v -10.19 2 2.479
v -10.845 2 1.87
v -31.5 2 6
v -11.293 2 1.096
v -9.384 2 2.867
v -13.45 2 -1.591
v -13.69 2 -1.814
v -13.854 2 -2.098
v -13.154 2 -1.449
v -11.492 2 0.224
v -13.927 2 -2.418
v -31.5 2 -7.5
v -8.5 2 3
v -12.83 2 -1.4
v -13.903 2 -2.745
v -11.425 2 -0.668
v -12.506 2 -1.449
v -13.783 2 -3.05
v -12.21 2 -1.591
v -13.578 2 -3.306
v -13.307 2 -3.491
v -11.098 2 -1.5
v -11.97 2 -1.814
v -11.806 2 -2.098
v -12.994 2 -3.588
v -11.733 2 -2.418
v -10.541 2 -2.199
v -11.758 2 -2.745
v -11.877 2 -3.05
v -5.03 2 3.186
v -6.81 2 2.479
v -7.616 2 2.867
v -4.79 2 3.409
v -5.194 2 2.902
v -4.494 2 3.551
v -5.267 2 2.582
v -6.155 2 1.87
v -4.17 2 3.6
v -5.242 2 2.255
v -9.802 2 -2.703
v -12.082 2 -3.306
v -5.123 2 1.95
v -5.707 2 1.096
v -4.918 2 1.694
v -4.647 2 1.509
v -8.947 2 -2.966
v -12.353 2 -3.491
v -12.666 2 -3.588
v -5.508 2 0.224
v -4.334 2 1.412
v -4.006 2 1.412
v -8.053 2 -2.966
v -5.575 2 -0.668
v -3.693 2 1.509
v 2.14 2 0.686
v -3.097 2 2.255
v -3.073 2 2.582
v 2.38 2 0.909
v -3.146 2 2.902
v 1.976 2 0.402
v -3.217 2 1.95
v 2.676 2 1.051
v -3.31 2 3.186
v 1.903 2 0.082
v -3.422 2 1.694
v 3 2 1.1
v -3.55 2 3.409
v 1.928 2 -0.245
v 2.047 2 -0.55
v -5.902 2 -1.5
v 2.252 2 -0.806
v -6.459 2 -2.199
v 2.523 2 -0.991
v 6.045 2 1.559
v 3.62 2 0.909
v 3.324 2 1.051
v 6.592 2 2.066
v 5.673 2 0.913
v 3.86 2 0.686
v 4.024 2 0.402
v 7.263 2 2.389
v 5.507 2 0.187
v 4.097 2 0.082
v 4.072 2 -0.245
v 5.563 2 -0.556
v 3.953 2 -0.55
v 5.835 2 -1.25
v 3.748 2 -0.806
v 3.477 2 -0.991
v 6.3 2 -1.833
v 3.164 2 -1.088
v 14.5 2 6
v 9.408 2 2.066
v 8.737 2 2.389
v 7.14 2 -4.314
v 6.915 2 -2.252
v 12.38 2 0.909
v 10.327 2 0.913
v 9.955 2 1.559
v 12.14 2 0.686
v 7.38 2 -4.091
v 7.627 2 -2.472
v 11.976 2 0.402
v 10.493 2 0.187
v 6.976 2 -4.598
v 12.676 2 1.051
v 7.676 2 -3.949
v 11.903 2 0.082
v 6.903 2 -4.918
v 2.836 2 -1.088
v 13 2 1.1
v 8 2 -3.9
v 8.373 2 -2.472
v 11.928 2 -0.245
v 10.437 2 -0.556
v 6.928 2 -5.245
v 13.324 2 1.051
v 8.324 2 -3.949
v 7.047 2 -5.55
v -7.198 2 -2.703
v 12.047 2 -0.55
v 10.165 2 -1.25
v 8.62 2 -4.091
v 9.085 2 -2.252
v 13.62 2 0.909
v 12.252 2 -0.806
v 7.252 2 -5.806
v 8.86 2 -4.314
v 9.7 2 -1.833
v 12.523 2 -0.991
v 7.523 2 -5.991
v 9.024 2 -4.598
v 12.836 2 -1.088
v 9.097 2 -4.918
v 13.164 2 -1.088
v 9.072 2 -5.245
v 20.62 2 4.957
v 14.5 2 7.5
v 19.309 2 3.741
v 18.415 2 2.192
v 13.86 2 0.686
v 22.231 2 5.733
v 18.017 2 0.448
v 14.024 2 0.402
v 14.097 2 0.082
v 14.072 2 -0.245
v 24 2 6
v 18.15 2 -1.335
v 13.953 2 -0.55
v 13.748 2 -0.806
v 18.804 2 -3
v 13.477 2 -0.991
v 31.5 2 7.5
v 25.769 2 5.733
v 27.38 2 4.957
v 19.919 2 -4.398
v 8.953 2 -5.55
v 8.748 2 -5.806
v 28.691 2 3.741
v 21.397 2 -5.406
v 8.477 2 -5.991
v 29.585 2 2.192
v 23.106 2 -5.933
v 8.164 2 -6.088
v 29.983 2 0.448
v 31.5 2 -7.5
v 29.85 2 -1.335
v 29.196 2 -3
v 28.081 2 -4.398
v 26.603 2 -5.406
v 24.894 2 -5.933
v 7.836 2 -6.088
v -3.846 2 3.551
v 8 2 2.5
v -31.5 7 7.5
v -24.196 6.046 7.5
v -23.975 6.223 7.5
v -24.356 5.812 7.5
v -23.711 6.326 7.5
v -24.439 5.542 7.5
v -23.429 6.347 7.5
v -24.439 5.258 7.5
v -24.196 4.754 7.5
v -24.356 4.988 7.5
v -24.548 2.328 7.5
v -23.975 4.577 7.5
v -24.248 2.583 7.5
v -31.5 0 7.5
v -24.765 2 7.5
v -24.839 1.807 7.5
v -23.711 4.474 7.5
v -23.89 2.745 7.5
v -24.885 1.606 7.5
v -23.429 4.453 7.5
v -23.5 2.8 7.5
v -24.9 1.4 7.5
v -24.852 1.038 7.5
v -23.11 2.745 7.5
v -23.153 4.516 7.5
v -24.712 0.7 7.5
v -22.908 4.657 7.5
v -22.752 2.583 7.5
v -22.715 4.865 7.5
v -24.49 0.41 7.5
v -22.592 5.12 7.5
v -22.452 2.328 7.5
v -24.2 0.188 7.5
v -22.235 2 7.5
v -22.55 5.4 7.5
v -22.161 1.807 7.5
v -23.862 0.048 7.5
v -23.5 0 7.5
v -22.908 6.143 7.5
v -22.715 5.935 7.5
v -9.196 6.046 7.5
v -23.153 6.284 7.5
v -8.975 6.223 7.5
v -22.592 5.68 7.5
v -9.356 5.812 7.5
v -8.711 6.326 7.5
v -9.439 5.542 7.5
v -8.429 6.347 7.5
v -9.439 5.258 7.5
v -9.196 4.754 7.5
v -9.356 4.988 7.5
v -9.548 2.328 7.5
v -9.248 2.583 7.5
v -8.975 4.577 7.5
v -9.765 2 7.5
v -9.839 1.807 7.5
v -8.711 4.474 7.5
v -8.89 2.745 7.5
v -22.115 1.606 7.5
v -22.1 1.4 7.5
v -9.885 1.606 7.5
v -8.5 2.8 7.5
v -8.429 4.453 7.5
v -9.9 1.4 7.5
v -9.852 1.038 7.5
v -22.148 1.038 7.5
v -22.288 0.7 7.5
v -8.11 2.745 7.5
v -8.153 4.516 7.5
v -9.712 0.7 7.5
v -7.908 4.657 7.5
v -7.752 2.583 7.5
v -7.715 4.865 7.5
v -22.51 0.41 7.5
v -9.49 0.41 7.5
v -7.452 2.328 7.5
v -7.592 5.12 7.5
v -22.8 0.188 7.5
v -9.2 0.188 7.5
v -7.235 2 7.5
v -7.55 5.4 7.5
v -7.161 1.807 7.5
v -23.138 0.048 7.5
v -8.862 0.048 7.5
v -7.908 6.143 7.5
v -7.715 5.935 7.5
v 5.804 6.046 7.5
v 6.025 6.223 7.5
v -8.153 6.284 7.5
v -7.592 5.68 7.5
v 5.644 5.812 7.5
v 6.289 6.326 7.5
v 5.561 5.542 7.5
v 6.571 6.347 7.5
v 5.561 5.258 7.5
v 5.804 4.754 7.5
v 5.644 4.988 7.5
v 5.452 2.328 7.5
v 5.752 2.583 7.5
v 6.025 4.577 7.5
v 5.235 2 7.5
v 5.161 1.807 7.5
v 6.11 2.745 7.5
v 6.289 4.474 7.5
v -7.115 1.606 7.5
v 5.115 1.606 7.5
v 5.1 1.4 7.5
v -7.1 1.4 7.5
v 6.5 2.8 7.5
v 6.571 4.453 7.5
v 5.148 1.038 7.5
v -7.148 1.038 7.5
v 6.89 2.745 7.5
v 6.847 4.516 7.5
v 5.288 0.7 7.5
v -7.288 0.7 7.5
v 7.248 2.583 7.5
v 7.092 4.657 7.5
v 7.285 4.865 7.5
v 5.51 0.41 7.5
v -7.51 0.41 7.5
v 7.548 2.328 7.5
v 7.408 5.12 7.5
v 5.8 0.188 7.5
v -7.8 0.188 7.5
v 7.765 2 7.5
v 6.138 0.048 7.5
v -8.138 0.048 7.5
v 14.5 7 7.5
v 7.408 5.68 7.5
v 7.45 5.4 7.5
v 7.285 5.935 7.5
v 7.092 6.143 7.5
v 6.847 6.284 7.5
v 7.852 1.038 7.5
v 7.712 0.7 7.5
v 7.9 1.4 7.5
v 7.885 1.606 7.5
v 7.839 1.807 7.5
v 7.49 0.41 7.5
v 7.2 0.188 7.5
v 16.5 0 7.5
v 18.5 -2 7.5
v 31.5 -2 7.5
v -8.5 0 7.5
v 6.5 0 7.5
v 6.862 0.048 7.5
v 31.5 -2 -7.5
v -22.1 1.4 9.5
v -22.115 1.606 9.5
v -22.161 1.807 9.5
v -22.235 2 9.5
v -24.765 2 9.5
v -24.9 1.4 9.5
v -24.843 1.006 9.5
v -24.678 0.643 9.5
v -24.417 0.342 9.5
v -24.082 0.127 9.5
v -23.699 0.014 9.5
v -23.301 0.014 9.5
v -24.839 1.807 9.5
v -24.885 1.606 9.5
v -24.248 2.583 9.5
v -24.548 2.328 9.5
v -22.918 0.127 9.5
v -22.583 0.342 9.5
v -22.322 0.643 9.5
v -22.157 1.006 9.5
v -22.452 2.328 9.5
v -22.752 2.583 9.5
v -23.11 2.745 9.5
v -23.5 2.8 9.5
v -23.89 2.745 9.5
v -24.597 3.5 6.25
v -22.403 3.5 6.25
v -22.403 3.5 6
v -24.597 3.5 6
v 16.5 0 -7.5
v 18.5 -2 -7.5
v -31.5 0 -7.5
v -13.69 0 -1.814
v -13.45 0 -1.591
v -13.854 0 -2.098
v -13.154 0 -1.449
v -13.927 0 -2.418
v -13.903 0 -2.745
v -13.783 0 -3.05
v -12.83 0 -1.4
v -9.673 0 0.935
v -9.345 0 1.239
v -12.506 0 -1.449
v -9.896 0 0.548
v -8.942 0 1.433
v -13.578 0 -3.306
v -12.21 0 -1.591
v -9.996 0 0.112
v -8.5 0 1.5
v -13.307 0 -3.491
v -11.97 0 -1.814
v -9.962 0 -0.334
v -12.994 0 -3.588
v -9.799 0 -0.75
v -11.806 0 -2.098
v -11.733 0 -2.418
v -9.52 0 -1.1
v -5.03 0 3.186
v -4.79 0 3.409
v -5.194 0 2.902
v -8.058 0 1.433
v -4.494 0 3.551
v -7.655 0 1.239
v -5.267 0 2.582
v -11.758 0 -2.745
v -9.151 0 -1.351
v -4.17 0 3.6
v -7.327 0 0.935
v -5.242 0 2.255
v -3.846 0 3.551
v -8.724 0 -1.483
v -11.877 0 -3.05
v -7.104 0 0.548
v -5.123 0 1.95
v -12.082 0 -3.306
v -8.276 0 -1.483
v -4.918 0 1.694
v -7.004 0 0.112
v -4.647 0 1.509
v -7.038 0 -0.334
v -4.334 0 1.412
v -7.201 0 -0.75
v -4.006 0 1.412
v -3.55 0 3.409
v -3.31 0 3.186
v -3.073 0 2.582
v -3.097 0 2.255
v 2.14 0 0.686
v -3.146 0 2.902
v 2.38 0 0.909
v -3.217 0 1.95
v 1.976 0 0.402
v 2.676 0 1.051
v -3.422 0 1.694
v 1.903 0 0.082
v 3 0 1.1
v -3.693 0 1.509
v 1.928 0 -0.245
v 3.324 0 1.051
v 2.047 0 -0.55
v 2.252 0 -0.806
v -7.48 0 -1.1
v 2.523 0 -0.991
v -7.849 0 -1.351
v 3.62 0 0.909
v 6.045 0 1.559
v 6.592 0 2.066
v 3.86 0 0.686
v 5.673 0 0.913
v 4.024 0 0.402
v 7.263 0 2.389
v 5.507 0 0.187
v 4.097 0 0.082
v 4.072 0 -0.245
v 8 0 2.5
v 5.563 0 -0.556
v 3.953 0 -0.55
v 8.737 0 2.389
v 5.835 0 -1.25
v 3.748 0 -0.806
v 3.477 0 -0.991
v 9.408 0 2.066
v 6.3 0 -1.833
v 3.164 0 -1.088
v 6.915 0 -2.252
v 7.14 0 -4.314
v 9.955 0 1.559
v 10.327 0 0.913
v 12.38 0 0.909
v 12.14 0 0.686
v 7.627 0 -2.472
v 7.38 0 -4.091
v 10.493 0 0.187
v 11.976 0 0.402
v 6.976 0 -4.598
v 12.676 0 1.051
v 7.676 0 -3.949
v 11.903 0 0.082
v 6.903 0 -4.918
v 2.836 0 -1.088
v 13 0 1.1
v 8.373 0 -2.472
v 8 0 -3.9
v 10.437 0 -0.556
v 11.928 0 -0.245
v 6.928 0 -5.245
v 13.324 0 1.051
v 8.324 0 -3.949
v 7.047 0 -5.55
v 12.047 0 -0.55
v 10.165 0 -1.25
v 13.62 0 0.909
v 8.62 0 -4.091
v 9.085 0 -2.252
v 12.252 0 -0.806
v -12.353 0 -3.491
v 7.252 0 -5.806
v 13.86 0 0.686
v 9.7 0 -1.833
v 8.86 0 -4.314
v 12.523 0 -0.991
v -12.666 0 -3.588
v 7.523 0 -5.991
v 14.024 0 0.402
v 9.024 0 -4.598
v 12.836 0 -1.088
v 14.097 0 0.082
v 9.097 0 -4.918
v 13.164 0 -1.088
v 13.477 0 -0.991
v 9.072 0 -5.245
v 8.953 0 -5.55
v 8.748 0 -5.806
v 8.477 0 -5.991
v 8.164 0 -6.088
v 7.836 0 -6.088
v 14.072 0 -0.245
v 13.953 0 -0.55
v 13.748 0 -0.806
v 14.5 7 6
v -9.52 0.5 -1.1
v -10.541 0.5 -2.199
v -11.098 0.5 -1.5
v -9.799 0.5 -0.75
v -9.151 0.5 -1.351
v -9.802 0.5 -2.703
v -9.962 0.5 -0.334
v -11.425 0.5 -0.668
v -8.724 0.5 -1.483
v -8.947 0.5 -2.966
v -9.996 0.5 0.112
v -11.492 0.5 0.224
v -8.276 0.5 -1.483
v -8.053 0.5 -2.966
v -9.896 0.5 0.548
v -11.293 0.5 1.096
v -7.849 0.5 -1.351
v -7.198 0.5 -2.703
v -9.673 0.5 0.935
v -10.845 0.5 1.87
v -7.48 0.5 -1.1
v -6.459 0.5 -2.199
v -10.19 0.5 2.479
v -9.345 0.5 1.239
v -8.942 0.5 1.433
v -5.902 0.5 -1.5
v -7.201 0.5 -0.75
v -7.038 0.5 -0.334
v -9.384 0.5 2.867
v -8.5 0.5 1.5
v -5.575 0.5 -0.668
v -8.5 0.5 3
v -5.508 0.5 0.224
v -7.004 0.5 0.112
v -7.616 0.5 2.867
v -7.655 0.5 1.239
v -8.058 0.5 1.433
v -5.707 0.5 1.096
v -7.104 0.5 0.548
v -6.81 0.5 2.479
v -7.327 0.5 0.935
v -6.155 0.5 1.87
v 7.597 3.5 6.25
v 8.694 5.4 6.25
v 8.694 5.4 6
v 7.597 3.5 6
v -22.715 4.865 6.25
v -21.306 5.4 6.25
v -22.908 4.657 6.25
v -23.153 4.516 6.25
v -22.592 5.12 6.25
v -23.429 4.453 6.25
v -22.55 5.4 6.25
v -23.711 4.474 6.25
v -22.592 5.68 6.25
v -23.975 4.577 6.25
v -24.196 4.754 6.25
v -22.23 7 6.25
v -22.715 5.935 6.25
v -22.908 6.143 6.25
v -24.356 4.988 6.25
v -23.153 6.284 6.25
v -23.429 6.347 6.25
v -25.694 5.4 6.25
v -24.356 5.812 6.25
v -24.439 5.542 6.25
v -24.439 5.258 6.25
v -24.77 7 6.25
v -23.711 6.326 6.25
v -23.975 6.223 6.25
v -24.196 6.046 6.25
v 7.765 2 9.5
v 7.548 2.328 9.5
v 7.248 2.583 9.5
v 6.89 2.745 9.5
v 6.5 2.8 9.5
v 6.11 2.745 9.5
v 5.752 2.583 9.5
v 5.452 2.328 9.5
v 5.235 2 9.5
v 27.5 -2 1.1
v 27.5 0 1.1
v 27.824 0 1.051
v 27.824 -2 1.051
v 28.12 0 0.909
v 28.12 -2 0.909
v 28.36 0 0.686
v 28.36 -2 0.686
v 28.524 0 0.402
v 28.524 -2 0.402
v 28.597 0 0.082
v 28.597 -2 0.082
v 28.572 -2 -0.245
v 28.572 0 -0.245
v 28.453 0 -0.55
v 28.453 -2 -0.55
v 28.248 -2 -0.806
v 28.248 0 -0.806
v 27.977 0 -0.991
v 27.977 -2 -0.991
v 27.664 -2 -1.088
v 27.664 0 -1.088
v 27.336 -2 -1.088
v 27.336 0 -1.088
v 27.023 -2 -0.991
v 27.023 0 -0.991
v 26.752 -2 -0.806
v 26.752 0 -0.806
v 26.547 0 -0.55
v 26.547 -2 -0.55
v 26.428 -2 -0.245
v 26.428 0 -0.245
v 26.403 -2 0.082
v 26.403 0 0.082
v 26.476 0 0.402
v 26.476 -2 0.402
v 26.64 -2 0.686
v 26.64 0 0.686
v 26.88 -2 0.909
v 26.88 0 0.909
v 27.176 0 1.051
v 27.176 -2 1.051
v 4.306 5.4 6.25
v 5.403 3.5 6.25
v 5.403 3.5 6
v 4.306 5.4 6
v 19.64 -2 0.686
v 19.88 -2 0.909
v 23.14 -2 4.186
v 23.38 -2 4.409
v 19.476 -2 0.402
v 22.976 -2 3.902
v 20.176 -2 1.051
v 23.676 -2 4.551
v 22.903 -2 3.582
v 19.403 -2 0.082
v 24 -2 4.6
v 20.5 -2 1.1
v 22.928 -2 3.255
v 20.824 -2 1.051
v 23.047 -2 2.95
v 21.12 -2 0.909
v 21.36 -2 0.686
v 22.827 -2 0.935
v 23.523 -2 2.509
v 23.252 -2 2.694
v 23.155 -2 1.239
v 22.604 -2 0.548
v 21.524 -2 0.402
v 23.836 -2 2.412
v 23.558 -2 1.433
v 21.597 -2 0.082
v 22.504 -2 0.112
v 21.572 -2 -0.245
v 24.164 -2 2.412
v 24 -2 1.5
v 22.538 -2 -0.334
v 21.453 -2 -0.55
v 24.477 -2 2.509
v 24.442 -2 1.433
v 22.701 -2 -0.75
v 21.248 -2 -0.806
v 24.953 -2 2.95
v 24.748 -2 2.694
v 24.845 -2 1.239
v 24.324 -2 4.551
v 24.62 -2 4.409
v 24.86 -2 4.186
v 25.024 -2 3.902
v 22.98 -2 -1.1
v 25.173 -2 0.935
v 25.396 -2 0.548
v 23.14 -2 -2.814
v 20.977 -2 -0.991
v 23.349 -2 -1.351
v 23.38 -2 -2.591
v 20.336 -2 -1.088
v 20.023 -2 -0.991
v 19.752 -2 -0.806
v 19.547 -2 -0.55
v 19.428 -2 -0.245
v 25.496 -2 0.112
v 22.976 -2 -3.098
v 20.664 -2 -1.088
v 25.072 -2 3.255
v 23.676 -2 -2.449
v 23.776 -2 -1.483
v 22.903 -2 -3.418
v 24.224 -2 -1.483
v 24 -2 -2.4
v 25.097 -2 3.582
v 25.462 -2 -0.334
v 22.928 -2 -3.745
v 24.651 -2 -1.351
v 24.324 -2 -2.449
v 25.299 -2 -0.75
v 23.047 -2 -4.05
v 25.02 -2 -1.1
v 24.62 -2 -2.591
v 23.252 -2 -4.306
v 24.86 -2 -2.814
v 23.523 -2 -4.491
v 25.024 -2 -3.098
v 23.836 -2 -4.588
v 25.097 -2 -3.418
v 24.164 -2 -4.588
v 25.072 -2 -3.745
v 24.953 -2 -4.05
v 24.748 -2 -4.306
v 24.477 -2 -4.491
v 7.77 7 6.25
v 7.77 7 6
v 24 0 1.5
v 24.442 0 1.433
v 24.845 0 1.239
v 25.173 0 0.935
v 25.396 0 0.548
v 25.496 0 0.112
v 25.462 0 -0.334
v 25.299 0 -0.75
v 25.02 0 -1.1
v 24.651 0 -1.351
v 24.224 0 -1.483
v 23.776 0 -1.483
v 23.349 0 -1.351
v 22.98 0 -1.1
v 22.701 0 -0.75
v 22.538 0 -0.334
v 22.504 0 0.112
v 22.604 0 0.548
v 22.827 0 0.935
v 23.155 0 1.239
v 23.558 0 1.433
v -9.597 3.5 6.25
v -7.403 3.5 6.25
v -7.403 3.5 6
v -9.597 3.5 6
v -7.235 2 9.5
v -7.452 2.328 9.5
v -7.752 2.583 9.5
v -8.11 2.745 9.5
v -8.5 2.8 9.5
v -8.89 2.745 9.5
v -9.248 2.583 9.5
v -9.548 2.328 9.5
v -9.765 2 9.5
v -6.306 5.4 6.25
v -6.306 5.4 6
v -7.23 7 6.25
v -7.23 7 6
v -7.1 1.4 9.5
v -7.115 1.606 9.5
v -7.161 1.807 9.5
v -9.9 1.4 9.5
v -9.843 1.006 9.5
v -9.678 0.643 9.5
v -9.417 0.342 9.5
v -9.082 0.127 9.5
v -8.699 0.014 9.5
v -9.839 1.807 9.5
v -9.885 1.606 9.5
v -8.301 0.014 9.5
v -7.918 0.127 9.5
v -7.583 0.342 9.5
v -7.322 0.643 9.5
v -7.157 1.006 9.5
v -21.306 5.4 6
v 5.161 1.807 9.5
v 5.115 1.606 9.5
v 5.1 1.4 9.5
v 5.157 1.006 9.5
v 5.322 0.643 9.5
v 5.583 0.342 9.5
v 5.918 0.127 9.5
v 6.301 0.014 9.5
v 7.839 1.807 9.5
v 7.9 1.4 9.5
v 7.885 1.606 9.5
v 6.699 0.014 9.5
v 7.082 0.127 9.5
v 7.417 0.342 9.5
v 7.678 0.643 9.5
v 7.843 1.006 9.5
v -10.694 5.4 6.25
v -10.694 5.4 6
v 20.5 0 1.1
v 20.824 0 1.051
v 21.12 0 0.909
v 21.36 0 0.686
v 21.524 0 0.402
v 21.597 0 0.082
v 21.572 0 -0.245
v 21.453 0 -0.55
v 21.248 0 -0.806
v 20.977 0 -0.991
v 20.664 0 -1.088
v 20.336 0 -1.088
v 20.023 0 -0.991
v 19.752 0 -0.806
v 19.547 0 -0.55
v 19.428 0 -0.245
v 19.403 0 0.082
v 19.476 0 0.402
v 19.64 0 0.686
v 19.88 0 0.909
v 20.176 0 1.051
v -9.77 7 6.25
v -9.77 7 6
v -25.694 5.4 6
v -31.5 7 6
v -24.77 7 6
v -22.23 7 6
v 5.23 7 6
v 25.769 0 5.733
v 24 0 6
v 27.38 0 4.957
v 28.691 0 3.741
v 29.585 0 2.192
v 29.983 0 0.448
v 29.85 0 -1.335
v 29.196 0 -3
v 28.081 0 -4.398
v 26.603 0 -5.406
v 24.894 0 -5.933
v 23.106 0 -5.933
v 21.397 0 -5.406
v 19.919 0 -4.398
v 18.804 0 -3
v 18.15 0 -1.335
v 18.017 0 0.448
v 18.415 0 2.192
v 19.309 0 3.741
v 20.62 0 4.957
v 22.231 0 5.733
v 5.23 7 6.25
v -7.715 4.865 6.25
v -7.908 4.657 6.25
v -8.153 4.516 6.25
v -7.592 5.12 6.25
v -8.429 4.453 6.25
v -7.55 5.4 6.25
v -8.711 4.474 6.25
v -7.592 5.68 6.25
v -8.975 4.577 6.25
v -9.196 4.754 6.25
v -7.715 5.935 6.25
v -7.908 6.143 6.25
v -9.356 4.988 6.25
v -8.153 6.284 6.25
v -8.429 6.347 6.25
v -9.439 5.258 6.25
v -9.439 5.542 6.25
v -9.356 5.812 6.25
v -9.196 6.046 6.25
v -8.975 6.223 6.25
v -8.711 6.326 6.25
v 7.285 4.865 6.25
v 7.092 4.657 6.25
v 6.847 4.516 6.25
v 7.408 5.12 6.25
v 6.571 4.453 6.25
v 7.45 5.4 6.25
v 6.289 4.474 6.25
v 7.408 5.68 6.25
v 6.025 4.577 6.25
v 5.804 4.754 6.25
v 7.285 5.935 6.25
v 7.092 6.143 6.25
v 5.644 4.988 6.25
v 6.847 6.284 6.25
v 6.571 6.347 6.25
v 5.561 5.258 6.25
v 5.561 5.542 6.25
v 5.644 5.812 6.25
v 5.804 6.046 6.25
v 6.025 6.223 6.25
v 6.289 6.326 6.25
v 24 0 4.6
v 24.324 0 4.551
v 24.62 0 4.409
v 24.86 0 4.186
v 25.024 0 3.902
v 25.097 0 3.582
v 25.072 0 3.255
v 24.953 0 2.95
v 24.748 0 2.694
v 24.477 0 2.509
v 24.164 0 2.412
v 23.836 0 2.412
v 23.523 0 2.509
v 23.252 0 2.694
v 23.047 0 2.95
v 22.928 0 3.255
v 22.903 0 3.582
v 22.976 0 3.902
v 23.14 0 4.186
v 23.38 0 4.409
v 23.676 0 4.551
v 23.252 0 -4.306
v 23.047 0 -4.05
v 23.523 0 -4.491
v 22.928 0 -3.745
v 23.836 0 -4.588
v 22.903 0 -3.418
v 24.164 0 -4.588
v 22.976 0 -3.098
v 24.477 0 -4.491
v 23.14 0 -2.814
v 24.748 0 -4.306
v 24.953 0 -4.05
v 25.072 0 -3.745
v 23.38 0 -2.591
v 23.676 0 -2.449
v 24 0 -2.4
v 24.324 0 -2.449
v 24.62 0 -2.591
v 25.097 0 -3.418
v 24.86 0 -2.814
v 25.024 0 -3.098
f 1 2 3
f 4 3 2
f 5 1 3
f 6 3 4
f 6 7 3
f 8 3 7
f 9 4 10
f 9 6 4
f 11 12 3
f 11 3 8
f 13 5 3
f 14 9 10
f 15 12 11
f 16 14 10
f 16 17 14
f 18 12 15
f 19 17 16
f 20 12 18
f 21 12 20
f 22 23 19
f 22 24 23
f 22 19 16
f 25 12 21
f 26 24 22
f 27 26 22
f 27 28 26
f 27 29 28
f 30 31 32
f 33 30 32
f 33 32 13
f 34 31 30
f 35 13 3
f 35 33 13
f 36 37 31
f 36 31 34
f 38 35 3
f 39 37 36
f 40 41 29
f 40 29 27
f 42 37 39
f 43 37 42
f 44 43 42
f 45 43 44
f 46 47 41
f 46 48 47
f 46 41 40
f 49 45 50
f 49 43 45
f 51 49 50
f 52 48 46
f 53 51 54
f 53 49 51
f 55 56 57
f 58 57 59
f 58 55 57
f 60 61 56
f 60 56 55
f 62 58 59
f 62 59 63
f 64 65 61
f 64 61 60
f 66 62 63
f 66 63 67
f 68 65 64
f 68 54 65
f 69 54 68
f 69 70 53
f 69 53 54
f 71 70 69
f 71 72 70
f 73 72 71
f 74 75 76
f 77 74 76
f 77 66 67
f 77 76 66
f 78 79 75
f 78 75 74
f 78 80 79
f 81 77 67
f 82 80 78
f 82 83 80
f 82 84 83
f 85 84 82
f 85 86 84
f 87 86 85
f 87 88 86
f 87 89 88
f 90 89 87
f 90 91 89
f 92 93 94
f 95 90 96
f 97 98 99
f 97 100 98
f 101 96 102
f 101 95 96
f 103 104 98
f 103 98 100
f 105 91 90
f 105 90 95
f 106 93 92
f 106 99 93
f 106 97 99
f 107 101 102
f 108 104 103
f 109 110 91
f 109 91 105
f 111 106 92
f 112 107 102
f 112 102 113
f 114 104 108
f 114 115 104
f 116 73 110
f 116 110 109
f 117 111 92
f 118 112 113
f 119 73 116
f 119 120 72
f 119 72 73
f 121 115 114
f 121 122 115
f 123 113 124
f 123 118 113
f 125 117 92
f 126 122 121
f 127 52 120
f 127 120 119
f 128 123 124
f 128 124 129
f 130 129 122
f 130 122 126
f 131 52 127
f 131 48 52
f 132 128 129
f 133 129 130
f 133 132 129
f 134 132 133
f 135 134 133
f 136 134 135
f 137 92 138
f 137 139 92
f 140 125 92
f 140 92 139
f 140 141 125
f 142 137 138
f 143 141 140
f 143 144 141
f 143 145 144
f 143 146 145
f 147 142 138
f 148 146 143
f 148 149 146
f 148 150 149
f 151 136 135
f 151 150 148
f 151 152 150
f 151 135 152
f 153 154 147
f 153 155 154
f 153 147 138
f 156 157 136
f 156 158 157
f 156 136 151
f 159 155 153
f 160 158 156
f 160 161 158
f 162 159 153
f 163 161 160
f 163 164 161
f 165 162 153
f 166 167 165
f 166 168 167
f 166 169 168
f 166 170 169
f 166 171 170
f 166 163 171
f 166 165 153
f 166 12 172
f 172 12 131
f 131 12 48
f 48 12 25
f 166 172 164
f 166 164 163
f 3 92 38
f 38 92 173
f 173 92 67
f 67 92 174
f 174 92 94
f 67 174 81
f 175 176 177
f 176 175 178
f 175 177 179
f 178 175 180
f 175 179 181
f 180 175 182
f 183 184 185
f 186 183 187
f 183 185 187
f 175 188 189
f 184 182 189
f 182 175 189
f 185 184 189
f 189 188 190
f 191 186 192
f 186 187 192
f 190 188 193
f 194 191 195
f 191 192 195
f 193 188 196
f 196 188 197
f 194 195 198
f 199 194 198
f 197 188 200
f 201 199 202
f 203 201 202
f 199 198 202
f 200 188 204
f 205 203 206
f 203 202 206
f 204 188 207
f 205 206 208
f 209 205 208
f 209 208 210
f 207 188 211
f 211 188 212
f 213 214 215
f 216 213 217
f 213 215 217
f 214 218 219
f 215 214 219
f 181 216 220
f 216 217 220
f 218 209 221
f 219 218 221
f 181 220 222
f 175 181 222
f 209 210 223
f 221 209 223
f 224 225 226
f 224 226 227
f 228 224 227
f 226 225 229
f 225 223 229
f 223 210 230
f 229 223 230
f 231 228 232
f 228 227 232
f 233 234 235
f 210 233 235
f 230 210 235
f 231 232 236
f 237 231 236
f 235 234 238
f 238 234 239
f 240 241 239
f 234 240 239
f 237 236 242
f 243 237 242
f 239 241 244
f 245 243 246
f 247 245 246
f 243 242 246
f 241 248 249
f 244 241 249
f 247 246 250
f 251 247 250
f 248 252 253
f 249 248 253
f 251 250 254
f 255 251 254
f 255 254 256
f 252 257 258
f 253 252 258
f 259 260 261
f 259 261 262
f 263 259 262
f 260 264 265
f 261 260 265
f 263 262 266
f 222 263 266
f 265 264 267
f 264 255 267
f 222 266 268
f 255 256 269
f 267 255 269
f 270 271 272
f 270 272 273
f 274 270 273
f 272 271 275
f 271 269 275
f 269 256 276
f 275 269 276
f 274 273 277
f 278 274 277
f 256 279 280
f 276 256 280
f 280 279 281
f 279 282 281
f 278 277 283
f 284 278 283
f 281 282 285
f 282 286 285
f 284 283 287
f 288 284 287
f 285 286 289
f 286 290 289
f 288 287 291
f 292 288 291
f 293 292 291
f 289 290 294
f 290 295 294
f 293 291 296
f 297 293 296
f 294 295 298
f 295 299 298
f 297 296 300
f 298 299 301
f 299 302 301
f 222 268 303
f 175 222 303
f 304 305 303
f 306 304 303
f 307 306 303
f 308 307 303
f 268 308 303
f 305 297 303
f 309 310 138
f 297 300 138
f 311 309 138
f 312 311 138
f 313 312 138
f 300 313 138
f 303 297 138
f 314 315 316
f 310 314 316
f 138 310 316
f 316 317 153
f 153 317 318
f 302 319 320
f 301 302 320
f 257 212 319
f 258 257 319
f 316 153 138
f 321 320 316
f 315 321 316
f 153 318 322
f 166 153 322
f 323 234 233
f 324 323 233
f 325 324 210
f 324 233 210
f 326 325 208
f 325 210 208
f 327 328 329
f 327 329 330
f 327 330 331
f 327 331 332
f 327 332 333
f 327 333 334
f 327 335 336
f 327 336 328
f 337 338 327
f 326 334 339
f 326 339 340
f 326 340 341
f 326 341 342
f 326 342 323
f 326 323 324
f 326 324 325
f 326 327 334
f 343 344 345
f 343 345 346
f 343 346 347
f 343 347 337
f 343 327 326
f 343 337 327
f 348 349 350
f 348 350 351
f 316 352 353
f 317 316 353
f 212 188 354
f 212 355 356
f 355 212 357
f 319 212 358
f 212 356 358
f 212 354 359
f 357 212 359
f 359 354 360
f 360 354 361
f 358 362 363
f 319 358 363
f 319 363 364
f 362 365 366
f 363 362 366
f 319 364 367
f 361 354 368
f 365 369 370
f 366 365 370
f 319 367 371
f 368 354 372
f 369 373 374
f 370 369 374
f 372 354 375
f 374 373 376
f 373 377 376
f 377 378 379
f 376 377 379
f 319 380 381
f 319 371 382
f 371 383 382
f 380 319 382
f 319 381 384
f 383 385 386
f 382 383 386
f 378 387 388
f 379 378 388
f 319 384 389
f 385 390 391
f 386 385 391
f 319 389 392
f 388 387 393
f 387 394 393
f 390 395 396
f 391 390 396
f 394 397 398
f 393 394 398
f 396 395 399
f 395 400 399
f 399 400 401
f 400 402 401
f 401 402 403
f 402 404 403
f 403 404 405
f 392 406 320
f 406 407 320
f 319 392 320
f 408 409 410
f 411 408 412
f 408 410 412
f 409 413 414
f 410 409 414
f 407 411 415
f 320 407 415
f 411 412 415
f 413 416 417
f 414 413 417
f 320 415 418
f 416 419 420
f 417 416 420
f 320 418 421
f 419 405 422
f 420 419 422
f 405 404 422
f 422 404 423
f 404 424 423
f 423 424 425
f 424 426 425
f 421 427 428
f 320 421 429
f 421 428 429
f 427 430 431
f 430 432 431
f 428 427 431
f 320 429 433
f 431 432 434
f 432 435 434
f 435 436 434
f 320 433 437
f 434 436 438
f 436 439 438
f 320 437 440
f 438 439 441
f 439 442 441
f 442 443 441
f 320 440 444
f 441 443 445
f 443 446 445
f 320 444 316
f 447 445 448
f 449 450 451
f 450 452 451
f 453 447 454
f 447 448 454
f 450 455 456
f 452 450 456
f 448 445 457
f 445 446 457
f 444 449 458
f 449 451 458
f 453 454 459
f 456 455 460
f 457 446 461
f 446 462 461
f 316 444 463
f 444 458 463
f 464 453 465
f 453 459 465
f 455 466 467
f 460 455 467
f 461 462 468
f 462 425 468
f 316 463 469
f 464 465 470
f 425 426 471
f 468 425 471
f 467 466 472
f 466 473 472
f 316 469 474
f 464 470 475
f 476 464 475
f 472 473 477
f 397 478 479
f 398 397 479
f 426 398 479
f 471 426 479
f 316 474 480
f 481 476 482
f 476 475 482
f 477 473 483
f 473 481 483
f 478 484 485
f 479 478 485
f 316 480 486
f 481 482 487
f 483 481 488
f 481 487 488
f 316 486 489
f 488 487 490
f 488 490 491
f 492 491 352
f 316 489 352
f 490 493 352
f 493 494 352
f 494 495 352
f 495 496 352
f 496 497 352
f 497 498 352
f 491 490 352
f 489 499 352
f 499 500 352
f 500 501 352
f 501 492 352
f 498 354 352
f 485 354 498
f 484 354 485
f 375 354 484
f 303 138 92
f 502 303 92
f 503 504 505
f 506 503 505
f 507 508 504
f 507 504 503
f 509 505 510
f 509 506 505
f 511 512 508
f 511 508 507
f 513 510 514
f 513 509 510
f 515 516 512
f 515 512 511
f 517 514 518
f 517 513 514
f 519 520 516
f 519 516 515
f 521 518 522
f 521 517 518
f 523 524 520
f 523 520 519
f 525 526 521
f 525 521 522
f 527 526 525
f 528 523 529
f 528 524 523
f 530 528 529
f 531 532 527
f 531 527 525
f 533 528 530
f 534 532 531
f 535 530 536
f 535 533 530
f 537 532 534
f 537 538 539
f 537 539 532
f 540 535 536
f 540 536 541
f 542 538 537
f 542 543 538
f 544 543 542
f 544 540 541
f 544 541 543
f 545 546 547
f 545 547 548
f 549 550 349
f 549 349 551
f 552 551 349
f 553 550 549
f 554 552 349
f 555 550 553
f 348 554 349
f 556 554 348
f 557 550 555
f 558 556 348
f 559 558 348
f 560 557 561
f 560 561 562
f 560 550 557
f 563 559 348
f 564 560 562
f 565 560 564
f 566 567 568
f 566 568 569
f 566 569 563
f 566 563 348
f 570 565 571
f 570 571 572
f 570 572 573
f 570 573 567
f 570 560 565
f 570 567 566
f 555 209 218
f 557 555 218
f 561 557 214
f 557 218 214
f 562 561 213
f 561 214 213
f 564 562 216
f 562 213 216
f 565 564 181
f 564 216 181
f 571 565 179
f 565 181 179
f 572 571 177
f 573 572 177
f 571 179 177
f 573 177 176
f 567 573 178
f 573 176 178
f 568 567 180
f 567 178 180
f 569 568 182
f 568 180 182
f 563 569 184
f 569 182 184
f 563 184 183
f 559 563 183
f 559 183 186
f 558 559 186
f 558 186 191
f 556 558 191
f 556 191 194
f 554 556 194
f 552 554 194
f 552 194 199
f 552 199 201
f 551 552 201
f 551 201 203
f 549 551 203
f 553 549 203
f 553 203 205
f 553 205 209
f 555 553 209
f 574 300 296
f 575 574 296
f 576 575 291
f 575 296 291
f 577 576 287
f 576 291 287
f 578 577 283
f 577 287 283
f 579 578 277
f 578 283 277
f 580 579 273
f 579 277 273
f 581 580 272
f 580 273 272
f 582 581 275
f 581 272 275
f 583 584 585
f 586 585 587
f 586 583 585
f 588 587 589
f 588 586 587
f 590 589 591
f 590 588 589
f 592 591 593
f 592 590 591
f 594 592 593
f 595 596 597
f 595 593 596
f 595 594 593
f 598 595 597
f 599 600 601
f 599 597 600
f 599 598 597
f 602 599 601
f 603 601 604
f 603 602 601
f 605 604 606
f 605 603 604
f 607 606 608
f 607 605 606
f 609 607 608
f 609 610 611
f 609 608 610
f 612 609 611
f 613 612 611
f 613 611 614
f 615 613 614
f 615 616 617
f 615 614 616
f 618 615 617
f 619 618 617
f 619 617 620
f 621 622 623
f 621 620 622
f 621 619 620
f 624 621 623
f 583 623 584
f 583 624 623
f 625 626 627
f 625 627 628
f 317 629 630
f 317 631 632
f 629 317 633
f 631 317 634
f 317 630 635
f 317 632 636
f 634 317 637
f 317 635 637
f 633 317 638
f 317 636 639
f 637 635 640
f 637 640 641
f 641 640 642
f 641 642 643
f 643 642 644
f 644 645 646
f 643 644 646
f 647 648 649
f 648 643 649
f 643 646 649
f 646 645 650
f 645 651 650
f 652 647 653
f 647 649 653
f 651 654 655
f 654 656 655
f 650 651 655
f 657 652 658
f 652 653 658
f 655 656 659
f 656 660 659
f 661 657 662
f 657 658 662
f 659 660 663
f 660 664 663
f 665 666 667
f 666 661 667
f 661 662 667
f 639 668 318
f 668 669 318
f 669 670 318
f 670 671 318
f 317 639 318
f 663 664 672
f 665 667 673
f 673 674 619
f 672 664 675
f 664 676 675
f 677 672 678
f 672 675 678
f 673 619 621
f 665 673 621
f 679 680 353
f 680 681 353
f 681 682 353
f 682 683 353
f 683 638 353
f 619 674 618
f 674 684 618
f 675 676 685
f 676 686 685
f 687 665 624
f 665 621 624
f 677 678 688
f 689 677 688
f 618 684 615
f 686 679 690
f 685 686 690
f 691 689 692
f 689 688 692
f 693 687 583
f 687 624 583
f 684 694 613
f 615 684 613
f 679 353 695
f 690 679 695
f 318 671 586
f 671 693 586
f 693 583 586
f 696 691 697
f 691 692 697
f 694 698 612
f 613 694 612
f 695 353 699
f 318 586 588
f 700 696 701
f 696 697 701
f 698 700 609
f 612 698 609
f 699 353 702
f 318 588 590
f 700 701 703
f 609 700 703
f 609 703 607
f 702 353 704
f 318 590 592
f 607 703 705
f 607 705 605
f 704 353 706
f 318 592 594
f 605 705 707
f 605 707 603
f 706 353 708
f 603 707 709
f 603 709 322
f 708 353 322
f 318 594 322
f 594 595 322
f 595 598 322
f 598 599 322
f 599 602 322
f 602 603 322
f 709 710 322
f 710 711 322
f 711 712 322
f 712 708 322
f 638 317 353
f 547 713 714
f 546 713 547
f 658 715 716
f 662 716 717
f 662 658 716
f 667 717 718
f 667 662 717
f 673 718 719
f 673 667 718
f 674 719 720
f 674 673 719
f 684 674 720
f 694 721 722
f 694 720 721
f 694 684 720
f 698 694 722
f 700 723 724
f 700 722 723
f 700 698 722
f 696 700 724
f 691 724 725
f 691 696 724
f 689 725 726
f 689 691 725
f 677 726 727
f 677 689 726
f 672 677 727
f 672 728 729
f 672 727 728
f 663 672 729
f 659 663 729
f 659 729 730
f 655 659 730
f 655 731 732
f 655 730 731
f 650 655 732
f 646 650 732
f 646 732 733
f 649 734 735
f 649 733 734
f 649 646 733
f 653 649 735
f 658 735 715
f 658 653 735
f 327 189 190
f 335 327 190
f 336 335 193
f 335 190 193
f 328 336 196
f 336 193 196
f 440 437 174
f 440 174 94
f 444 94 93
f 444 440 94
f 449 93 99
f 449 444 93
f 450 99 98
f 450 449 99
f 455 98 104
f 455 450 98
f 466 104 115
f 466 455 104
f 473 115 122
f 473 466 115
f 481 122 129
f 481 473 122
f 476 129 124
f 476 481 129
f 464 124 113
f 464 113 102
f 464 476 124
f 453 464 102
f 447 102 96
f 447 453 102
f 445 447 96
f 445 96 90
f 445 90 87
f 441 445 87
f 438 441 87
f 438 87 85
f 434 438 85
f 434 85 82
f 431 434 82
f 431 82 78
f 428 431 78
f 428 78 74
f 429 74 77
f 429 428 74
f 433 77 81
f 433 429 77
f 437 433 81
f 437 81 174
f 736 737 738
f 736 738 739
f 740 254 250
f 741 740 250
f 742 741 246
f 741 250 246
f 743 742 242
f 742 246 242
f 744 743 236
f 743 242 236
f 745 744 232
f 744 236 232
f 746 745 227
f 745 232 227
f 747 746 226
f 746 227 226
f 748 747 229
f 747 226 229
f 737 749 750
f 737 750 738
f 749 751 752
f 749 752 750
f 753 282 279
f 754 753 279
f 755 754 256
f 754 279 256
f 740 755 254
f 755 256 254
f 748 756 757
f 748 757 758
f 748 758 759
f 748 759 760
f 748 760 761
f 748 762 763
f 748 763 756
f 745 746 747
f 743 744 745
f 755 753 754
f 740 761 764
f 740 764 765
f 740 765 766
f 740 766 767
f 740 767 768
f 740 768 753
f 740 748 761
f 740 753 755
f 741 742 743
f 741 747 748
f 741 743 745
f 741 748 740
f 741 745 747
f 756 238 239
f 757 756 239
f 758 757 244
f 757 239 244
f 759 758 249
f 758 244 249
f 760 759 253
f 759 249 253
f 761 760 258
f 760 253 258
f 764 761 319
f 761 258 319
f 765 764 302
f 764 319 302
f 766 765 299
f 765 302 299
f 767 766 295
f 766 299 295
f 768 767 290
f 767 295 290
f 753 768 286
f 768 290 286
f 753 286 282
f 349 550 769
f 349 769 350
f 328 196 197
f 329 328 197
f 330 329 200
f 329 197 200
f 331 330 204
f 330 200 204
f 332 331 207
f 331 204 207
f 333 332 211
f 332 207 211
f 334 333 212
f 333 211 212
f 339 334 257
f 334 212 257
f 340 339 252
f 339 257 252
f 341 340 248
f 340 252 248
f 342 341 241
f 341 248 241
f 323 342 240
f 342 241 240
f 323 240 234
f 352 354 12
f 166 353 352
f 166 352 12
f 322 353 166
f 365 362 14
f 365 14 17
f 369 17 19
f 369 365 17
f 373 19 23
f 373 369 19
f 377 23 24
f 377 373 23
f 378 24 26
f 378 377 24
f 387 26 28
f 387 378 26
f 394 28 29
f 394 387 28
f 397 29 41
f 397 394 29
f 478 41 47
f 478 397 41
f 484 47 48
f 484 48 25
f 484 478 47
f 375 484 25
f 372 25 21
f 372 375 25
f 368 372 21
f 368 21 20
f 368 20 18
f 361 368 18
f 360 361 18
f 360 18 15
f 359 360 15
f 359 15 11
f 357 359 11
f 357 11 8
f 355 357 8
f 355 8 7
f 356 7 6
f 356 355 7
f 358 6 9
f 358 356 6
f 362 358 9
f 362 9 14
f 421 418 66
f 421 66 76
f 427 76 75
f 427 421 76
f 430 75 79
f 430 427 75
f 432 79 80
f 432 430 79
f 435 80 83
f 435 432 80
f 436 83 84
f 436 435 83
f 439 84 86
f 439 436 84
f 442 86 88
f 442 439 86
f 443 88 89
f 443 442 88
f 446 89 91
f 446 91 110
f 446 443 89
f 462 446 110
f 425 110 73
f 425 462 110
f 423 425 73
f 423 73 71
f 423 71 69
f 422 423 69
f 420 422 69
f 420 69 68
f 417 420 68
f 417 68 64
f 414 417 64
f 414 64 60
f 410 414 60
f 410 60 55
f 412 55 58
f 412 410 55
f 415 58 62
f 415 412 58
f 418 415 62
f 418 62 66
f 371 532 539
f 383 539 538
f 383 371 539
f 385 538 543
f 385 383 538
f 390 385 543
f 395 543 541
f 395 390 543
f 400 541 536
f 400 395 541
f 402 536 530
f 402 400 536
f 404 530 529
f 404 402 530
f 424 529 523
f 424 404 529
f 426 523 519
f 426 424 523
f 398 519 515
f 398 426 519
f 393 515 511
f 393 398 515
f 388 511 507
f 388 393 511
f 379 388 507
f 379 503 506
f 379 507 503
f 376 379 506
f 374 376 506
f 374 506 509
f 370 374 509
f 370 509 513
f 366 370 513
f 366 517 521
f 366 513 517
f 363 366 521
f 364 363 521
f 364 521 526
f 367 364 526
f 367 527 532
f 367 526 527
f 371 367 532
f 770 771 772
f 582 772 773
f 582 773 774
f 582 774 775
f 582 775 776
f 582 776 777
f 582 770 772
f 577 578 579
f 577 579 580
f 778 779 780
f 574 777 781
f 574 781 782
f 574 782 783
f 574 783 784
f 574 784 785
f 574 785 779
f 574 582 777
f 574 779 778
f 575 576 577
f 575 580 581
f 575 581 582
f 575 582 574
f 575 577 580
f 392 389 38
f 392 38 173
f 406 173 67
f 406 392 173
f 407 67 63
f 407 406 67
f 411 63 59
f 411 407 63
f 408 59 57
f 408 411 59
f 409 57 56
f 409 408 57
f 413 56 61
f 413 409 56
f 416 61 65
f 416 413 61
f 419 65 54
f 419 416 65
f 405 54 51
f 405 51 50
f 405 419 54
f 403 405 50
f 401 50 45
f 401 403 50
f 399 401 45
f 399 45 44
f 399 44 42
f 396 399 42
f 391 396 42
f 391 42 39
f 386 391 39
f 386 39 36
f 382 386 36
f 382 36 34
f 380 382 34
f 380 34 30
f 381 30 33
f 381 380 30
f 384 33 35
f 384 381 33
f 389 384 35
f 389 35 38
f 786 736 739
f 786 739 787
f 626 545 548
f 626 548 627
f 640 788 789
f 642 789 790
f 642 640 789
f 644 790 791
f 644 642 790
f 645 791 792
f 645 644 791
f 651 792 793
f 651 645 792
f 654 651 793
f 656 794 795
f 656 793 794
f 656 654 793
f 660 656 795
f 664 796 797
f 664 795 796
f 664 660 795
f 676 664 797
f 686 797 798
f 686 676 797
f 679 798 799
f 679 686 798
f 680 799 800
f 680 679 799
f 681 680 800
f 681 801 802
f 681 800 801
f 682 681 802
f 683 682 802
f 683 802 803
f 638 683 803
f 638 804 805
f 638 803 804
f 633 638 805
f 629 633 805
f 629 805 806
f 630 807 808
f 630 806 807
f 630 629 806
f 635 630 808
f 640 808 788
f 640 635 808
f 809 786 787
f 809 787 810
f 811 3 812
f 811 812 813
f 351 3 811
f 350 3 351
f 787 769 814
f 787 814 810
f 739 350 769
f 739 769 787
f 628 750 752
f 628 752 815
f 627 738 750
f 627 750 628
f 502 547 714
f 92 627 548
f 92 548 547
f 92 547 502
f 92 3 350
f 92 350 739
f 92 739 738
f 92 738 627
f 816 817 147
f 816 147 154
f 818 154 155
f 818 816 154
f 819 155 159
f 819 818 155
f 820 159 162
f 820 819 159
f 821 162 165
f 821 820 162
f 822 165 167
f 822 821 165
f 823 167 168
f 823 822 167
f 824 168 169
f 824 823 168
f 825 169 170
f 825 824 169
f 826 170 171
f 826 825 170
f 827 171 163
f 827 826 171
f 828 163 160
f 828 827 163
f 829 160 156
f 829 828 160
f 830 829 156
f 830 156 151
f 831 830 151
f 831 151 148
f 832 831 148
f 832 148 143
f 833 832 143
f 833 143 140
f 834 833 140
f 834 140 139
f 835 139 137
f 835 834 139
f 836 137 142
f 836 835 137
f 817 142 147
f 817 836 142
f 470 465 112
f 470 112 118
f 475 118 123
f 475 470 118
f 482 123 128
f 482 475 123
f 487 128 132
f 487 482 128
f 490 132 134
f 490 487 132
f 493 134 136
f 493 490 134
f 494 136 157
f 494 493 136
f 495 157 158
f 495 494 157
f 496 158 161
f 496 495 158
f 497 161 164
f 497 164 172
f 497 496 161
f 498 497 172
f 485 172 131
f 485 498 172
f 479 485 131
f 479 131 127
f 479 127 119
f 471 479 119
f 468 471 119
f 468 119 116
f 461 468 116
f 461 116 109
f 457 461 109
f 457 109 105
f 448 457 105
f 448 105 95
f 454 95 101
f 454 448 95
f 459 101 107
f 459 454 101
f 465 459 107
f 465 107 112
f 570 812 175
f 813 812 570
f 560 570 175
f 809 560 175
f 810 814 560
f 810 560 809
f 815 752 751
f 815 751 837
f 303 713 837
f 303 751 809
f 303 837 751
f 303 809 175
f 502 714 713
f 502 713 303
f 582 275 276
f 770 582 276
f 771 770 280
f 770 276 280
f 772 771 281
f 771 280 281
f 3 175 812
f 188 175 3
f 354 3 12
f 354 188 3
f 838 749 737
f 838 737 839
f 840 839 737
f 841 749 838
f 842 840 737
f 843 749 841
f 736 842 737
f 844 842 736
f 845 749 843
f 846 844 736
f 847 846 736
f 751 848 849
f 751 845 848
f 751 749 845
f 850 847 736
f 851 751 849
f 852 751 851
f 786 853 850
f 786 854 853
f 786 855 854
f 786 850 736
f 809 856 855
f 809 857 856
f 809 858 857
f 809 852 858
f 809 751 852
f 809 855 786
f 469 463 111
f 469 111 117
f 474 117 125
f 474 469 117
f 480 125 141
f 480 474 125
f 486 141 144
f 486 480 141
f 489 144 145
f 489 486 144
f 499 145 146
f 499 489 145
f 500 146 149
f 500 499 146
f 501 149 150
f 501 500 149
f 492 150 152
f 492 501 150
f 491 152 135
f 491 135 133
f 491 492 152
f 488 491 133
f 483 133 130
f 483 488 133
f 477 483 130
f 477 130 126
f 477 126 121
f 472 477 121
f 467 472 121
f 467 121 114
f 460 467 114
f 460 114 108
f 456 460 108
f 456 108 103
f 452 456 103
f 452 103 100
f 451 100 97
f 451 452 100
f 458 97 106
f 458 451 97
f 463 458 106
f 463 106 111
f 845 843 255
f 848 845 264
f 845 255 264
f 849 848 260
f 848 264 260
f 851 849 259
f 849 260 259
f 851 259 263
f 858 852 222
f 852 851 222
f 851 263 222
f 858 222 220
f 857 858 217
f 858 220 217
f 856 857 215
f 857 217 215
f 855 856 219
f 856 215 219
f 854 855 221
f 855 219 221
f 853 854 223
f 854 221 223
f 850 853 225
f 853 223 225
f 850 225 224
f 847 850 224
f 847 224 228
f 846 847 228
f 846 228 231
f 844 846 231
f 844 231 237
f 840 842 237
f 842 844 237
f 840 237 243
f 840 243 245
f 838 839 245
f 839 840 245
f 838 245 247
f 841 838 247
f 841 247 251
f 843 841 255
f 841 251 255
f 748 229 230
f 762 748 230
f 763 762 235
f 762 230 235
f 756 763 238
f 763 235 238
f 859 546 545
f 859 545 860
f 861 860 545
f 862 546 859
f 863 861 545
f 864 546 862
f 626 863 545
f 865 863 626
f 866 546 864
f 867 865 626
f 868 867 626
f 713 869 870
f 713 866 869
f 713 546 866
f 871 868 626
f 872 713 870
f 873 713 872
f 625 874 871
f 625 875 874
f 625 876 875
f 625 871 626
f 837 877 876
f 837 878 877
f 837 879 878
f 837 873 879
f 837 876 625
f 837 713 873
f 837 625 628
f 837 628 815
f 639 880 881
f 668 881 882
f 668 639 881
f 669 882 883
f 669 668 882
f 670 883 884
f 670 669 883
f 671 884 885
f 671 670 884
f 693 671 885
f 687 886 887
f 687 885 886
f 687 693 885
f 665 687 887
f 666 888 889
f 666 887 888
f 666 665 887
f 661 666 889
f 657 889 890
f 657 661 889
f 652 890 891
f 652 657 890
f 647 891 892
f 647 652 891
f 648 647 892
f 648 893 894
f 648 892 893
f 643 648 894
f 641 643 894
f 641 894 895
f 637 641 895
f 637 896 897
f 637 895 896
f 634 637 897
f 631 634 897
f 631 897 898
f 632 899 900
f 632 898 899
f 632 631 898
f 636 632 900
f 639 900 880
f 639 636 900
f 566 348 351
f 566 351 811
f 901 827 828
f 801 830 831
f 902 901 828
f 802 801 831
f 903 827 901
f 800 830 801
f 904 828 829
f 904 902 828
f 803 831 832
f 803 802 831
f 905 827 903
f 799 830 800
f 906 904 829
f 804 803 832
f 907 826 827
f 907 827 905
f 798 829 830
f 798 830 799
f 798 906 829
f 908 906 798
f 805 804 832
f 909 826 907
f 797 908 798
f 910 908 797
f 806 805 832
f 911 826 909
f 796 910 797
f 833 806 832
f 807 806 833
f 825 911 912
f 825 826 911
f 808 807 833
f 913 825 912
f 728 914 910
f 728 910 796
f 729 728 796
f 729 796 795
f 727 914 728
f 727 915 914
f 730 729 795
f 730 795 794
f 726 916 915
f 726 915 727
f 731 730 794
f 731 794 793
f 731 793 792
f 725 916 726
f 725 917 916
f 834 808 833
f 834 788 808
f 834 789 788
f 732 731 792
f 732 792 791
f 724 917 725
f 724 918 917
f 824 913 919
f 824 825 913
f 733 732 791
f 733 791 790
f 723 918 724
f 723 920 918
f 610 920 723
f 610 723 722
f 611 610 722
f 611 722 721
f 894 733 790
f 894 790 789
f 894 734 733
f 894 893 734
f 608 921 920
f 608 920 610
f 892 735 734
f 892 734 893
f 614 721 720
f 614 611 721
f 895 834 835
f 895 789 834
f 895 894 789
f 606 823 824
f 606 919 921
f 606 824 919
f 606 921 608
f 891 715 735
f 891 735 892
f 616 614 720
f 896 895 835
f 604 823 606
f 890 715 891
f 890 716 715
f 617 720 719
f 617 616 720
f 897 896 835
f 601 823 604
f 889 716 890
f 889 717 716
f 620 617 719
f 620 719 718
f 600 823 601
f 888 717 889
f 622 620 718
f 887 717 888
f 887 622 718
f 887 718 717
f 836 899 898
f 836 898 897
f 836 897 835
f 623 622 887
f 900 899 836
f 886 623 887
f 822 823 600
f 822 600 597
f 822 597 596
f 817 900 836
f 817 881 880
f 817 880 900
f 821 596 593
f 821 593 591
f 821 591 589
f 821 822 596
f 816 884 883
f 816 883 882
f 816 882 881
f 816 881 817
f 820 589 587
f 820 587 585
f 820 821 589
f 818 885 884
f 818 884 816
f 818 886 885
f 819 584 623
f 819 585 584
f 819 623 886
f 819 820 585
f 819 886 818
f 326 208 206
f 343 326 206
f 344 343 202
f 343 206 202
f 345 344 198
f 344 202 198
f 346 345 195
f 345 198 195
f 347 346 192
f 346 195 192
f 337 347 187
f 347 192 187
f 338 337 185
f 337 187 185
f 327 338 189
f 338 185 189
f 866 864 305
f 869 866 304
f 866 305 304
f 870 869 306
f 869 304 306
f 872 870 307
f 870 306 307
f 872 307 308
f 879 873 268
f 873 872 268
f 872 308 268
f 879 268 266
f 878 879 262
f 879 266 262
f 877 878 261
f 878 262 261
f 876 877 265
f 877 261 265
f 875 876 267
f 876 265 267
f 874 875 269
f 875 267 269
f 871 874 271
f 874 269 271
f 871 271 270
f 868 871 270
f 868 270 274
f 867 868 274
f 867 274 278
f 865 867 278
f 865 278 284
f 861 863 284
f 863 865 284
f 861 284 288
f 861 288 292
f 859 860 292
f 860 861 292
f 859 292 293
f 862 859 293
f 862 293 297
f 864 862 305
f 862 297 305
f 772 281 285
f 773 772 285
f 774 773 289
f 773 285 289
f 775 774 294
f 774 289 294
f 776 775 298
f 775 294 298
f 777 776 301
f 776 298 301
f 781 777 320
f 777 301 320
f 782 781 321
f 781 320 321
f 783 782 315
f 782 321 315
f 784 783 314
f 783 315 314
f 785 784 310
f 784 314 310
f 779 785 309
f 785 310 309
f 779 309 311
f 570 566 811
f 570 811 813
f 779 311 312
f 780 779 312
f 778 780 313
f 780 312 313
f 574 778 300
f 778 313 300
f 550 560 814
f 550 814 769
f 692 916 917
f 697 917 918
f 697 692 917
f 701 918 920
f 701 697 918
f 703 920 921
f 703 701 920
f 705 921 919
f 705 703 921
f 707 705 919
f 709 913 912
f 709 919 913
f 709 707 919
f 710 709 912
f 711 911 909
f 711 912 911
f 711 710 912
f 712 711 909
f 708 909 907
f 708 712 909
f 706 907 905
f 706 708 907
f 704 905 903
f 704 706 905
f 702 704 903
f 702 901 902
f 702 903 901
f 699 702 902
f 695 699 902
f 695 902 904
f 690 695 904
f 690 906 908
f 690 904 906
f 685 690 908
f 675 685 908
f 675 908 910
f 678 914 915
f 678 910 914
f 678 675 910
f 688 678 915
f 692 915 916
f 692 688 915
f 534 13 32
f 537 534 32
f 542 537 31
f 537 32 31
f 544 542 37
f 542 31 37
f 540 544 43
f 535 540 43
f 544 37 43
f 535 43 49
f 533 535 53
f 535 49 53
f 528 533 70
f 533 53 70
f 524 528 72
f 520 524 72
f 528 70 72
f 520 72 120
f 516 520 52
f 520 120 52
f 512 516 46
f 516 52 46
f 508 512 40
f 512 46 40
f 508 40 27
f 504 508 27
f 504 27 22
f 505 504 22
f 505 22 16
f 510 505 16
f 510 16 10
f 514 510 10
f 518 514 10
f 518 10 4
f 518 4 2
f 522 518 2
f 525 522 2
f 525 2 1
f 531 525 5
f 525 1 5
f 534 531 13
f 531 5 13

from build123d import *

# Parameters (mm, degrees)
SKETCH_1_W          = 48
SKETCH_1_H          = 15
SKETCH_1_R          = 1.1
SKETCH_1_R_2        = 1.5
SKETCH_1_R_3        = 2.5
EXTRUDE_1_DEPTH     = 2
EXTRUDE_2_DEPTH     = 2
SKETCH_4_R          = 3
CUT_EXTRUDE_1_DEPTH = 1.5
SKETCH_5_W          = 46
SKETCH_5_H          = 1.5
EXTRUDE_3_DEPTH     = 5
SKETCH_2_3_R        = 0.95
CUT_EXTRUDE_2_DEPTH = 6
CUT_EXTRUDE_START   = -0.25
SKETCH_7_R          = 0.95
CUT_EXTRUDE_3_DEPTH = 0.25
SKETCH_1_3_W        = 15
SKETCH_1_3_H        = 15
SKETCH_1_3_R        = 6
SKETCH_1_3_R_2      = 1.5
SKETCH_1_3_R_3      = 1.1
EXTRUDE_4_DEPTH     = 2
EXTRUDE_START       = -2
SKETCH_1_4_W        = 15
SKETCH_1_4_H        = 15
SKETCH_1_4_R        = 6
SKETCH_1_4_R_2      = 1.5
SKETCH_1_4_R_3      = 1.1
EXTRUDE_5_DEPTH     = 2
SKETCH_1_5_R        = 6
CUT_EXTRUDE_4_DEPTH = 2
CUT_EXTRUDE_5_DEPTH = 15


with BuildPart() as part:
    # 草图1 → 凸台-拉伸1 (new body)
    with BuildSketch(Plane(origin=(0, 0, 0), x_dir=(1, 0, 0), z_dir=(0, 1, 0))):
        with Locations((-7.5, 0)):
            Rectangle(SKETCH_1_W, SKETCH_1_H)
        with Locations(Location((-4.169872981, -2.5, 0), (0, 0, 270))):
            Circle(SKETCH_1_R, mode=Mode.SUBTRACT)
        with Locations(Location((3, 0, 0), (0, 0, 270))):
            Circle(SKETCH_1_R, mode=Mode.SUBTRACT)
        with Locations(Location((-8.5, 0, 0), (0, 0, 270))):
            Circle(SKETCH_1_R_2, mode=Mode.SUBTRACT)
        with Locations(Location((-12.830127019, 2.5, 0), (0, 0, 270))):
            Circle(SKETCH_1_R, mode=Mode.SUBTRACT)
        with Locations(Location((8, 0, 0), (0, 0, 270))):
            Circle(SKETCH_1_R_3, mode=Mode.SUBTRACT)
        with Locations(Location((13, 0, 0), (0, 0, 270))):
            Circle(SKETCH_1_R, mode=Mode.SUBTRACT)
        with Locations(Location((8, 5, 0), (0, 0, 270))):
            Circle(SKETCH_1_R, mode=Mode.SUBTRACT)
    extrude(amount=EXTRUDE_1_DEPTH)

    # 草图2 → 凸台-拉伸2 (add)
    with BuildSketch(Plane.XY.offset(7.5)):
        with BuildLine():
            Line((-22.1, 1.4), (-24.9, 1.4))
            ThreePointArc((-24.9, 1.4), (-23.5, 0), (-22.1, 1.4))
        make_face()
        with BuildLine():
            ThreePointArc((-24.764911064, 2), (-24.865810289, 1.707509764), (-24.9, 1.4))
            Line((-24.9, 1.4), (-22.1, 1.4))
            ThreePointArc((-22.1, 1.4), (-22.134189711, 1.707509764), (-22.235088936, 2))
            Line((-22.235088936, 2), (-24.764911064, 2))
        make_face()
        with BuildLine():
            ThreePointArc((-22.235088936, 2), (-23.5, 2.8), (-24.764911064, 2))
            Line((-24.764911064, 2), (-22.235088936, 2))
        make_face()
        with BuildLine():
            Line((-7.1, 1.4), (-9.9, 1.4))
            ThreePointArc((-9.9, 1.4), (-8.5, 0), (-7.1, 1.4))
        make_face()
        with BuildLine():
            ThreePointArc((-9.764911064, 2), (-9.865810289, 1.707509764), (-9.9, 1.4))
            Line((-9.9, 1.4), (-7.1, 1.4))
            ThreePointArc((-7.1, 1.4), (-7.134189711, 1.707509764), (-7.235088936, 2))
            Line((-7.235088936, 2), (-9.764911064, 2))
        make_face()
        with BuildLine():
            ThreePointArc((-7.235088936, 2), (-8.5, 2.8), (-9.764911064, 2))
            Line((-9.764911064, 2), (-7.235088936, 2))
        make_face()
        with BuildLine():
            Line((7.9, 1.4), (5.1, 1.4))
            ThreePointArc((5.1, 1.4), (6.5, 0), (7.9, 1.4))
        make_face()
        with BuildLine():
            ThreePointArc((5.235088936, 2), (5.134189711, 1.707509764), (5.1, 1.4))
            Line((5.1, 1.4), (7.9, 1.4))
            ThreePointArc((7.9, 1.4), (7.865810289, 1.707509764), (7.764911064, 2))
            Line((7.764911064, 2), (5.235088936, 2))
        make_face()
        with BuildLine():
            ThreePointArc((7.764911064, 2), (6.5, 2.8), (5.235088936, 2))
            Line((5.235088936, 2), (7.764911064, 2))
        make_face()
    extrude(amount=EXTRUDE_2_DEPTH)

    # 草图4 → 切除-拉伸1 (cut)
    with BuildSketch(Plane(origin=(0, 2, 0), x_dir=(1, 0, 0), z_dir=(0, 1, 0))):
        with Locations(Location((-8.5, 0, 0), (0, 0, 270))):
            Circle(SKETCH_4_R)
    extrude(amount=-CUT_EXTRUDE_1_DEPTH, mode=Mode.SUBTRACT)

    # 草图5 → 凸台-拉伸3 (add)
    with BuildSketch(Plane(origin=(0, 2, 0), x_dir=(1, 0, 0), z_dir=(0, 1, 0))):
        with Locations((-8.5, -6.75)):
            Rectangle(SKETCH_5_W, SKETCH_5_H)
    extrude(amount=EXTRUDE_3_DEPTH)

    # 草图2<3> → 切除-拉伸2 (cut)
    with BuildSketch(Plane.XY.offset(7.5)):
        with Locations((-23.5, 5.4)):
            Circle(SKETCH_2_3_R)
        with Locations((-8.5, 5.4)):
            Circle(SKETCH_2_3_R)
        with Locations((6.5, 5.4)):
            Circle(SKETCH_2_3_R)
    extrude(amount=-CUT_EXTRUDE_2_DEPTH, mode=Mode.SUBTRACT)

    # 草图7 → 切除-拉伸3 (cut)
    # profile 1 of 3: a face of its own
    with BuildSketch(Plane(origin=(0, 0, 6), x_dir=(-1, 0, 0), z_dir=(0, 0, -1)).offset(CUT_EXTRUDE_START)):
        Polygon((-7.596965511, 3.5), (-5.403034489, 3.5), (-4.306068977, 5.4), (-5.403034489, 7.3), (-7.596965511, 7.3), (-8.693931023, 5.4), align=None)
        with Locations(Location((-6.5, 5.4, 0), (0, 0, 180))):
            Circle(SKETCH_7_R, mode=Mode.SUBTRACT)
    # profile 2 of 3: a face of its own
    with BuildSketch(Plane(origin=(0, 0, 6), x_dir=(-1, 0, 0), z_dir=(0, 0, -1)).offset(CUT_EXTRUDE_START)):
        Polygon((6.306068977, 5.4), (7.403034489, 3.5), (9.596965511, 3.5), (10.693931023, 5.4), (9.596965511, 7.3), (7.403034489, 7.3), align=None)
        with Locations(Location((8.5, 5.4, 0), (0, 0, 180))):
            Circle(SKETCH_7_R, mode=Mode.SUBTRACT)
    # profile 3 of 3: a face of its own
    with BuildSketch(Plane(origin=(0, 0, 6), x_dir=(-1, 0, 0), z_dir=(0, 0, -1)).offset(CUT_EXTRUDE_START)):
        Polygon((21.306068977, 5.4), (22.403034489, 3.5), (24.596965511, 3.5), (25.693931023, 5.4), (24.596965511, 7.3), (22.403034489, 7.3), align=None)
    extrude(amount=CUT_EXTRUDE_3_DEPTH, mode=Mode.SUBTRACT)

    # 草图1<3> → 凸台-拉伸4 (add)
    # profile 1 of 2: a face of its own
    with BuildSketch(Plane(origin=(0, 0, 0), x_dir=(1, 0, 0), z_dir=(0, 1, 0))):
        with Locations((24, 0)):
            Rectangle(SKETCH_1_3_W, SKETCH_1_3_H)
        with Locations((24, 0)):
            Circle(SKETCH_1_3_R, mode=Mode.SUBTRACT)
    # profile 2 of 2: a face of its own
    with BuildSketch(Plane(origin=(0, 0, 0), x_dir=(1, 0, 0), z_dir=(0, 1, 0))):
        with Locations((24, 0)):
            Circle(SKETCH_1_3_R)
        with Locations(Location((24, 0, 0), (0, 0, 270))):
            Circle(SKETCH_1_3_R_2, mode=Mode.SUBTRACT)
        with Locations(Location((27.5, 0, 0), (0, 0, 270))):
            Circle(SKETCH_1_3_R_3, mode=Mode.SUBTRACT)
        with Locations(Location((24, -3.5, 0), (0, 0, 270))):
            Circle(SKETCH_1_3_R_3, mode=Mode.SUBTRACT)
        with Locations(Location((20.5, 0, 0), (0, 0, 270))):
            Circle(SKETCH_1_3_R_3, mode=Mode.SUBTRACT)
        with Locations(Location((24, 3.5, 0), (0, 0, 270))):
            Circle(SKETCH_1_3_R_3, mode=Mode.SUBTRACT)
    extrude(amount=EXTRUDE_4_DEPTH)

    # 草图1<4> → 凸台-拉伸5 (add)
    # profile 1 of 2: a face of its own
    with BuildSketch(Plane(origin=(0, 0, 0), x_dir=(1, 0, 0), z_dir=(0, 1, 0)).offset(EXTRUDE_START)):
        with Locations((24, 0)):
            Rectangle(SKETCH_1_4_W, SKETCH_1_4_H)
        with Locations((24, 0)):
            Circle(SKETCH_1_4_R, mode=Mode.SUBTRACT)
    # profile 2 of 2: a face of its own
    with BuildSketch(Plane(origin=(0, 0, 0), x_dir=(1, 0, 0), z_dir=(0, 1, 0)).offset(EXTRUDE_START)):
        with Locations((24, 0)):
            Circle(SKETCH_1_4_R)
        with Locations(Location((24, 0, 0), (0, 0, 270))):
            Circle(SKETCH_1_4_R_2, mode=Mode.SUBTRACT)
        with Locations(Location((27.5, 0, 0), (0, 0, 270))):
            Circle(SKETCH_1_4_R_3, mode=Mode.SUBTRACT)
        with Locations(Location((24, -3.5, 0), (0, 0, 270))):
            Circle(SKETCH_1_4_R_3, mode=Mode.SUBTRACT)
        with Locations(Location((20.5, 0, 0), (0, 0, 270))):
            Circle(SKETCH_1_4_R_3, mode=Mode.SUBTRACT)
        with Locations(Location((24, 3.5, 0), (0, 0, 270))):
            Circle(SKETCH_1_4_R_3, mode=Mode.SUBTRACT)
    extrude(amount=EXTRUDE_5_DEPTH)

    # 草图1<5> → 切除-拉伸4 (cut)
    with BuildSketch(Plane(origin=(0, 0, 0), x_dir=(1, 0, 0), z_dir=(0, 1, 0))):
        with Locations(Location((24, 0, 0), (0, 0, 270))):
            Circle(SKETCH_1_5_R)
    extrude(amount=CUT_EXTRUDE_4_DEPTH, mode=Mode.SUBTRACT)

    # 草图8 → 切除-拉伸5 (cut)
    with BuildSketch(Plane(origin=(0, 0, -7.5), x_dir=(-1, 0, 0), z_dir=(0, 0, -1))):
        Polygon((-16.5, 0), (-18.5, -2), (-16.5, -2), align=None)
    extrude(amount=-CUT_EXTRUDE_5_DEPTH, mode=Mode.SUBTRACT)


solid = part.part
